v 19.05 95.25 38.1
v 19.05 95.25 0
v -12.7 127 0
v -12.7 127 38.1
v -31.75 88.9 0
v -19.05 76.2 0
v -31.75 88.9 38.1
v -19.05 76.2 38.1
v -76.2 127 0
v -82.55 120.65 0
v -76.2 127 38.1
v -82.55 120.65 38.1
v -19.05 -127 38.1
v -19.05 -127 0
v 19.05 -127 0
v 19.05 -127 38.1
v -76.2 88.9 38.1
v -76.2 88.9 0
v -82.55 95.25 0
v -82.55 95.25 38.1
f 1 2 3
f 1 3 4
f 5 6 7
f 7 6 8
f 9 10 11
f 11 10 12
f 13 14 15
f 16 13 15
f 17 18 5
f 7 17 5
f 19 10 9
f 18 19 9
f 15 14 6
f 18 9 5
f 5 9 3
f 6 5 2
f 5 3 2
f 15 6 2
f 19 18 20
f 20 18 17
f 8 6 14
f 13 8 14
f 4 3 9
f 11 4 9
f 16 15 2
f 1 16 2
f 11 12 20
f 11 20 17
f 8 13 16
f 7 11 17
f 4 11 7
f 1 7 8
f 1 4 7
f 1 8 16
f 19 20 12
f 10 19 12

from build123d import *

# Parameters (mm, degrees)
F0_W     = 38.1
F0_H     = 215.9
F0_H_2   = 38.1
F0_W_2   = 63.5
F1_DEPTH = 38.1
F2_SIZE  = 12.7
F3_SIZE  = 31.75
F4_SIZE  = 6.35


with BuildPart() as f1:
    # F0 (on Top) → F1 (new body)
    with BuildSketch(Plane.XY):
        with Locations((0, -19.05)):
            Rectangle(F0_W, F0_H)
        with Locations((0, 107.95)):
            Rectangle(F0_W, F0_H_2)
        with Locations((-50.8, 107.95)):
            Rectangle(F0_W_2, F0_H_2)
    extrude(amount=F1_DEPTH)

    # F2
    f2_edges = [f1.edges().sort_by_distance(p)[0] for p in [
        (-19.05, 88.9, 19.05),
    ]]
    chamfer(f2_edges, length=F2_SIZE)

    # F3
    f3_edges = [f1.edges().sort_by_distance(p)[0] for p in [
        (19.05, 127, 19.05),
    ]]
    chamfer(f3_edges, length=F3_SIZE)

    # F4
    f4_edges = [f1.edges().sort_by_distance(p)[0] for p in [
        (-82.55, 88.9, 19.05),
        (-82.55, 127, 19.05),
    ]]
    chamfer(f4_edges, length=F4_SIZE)


solid = f1.part
